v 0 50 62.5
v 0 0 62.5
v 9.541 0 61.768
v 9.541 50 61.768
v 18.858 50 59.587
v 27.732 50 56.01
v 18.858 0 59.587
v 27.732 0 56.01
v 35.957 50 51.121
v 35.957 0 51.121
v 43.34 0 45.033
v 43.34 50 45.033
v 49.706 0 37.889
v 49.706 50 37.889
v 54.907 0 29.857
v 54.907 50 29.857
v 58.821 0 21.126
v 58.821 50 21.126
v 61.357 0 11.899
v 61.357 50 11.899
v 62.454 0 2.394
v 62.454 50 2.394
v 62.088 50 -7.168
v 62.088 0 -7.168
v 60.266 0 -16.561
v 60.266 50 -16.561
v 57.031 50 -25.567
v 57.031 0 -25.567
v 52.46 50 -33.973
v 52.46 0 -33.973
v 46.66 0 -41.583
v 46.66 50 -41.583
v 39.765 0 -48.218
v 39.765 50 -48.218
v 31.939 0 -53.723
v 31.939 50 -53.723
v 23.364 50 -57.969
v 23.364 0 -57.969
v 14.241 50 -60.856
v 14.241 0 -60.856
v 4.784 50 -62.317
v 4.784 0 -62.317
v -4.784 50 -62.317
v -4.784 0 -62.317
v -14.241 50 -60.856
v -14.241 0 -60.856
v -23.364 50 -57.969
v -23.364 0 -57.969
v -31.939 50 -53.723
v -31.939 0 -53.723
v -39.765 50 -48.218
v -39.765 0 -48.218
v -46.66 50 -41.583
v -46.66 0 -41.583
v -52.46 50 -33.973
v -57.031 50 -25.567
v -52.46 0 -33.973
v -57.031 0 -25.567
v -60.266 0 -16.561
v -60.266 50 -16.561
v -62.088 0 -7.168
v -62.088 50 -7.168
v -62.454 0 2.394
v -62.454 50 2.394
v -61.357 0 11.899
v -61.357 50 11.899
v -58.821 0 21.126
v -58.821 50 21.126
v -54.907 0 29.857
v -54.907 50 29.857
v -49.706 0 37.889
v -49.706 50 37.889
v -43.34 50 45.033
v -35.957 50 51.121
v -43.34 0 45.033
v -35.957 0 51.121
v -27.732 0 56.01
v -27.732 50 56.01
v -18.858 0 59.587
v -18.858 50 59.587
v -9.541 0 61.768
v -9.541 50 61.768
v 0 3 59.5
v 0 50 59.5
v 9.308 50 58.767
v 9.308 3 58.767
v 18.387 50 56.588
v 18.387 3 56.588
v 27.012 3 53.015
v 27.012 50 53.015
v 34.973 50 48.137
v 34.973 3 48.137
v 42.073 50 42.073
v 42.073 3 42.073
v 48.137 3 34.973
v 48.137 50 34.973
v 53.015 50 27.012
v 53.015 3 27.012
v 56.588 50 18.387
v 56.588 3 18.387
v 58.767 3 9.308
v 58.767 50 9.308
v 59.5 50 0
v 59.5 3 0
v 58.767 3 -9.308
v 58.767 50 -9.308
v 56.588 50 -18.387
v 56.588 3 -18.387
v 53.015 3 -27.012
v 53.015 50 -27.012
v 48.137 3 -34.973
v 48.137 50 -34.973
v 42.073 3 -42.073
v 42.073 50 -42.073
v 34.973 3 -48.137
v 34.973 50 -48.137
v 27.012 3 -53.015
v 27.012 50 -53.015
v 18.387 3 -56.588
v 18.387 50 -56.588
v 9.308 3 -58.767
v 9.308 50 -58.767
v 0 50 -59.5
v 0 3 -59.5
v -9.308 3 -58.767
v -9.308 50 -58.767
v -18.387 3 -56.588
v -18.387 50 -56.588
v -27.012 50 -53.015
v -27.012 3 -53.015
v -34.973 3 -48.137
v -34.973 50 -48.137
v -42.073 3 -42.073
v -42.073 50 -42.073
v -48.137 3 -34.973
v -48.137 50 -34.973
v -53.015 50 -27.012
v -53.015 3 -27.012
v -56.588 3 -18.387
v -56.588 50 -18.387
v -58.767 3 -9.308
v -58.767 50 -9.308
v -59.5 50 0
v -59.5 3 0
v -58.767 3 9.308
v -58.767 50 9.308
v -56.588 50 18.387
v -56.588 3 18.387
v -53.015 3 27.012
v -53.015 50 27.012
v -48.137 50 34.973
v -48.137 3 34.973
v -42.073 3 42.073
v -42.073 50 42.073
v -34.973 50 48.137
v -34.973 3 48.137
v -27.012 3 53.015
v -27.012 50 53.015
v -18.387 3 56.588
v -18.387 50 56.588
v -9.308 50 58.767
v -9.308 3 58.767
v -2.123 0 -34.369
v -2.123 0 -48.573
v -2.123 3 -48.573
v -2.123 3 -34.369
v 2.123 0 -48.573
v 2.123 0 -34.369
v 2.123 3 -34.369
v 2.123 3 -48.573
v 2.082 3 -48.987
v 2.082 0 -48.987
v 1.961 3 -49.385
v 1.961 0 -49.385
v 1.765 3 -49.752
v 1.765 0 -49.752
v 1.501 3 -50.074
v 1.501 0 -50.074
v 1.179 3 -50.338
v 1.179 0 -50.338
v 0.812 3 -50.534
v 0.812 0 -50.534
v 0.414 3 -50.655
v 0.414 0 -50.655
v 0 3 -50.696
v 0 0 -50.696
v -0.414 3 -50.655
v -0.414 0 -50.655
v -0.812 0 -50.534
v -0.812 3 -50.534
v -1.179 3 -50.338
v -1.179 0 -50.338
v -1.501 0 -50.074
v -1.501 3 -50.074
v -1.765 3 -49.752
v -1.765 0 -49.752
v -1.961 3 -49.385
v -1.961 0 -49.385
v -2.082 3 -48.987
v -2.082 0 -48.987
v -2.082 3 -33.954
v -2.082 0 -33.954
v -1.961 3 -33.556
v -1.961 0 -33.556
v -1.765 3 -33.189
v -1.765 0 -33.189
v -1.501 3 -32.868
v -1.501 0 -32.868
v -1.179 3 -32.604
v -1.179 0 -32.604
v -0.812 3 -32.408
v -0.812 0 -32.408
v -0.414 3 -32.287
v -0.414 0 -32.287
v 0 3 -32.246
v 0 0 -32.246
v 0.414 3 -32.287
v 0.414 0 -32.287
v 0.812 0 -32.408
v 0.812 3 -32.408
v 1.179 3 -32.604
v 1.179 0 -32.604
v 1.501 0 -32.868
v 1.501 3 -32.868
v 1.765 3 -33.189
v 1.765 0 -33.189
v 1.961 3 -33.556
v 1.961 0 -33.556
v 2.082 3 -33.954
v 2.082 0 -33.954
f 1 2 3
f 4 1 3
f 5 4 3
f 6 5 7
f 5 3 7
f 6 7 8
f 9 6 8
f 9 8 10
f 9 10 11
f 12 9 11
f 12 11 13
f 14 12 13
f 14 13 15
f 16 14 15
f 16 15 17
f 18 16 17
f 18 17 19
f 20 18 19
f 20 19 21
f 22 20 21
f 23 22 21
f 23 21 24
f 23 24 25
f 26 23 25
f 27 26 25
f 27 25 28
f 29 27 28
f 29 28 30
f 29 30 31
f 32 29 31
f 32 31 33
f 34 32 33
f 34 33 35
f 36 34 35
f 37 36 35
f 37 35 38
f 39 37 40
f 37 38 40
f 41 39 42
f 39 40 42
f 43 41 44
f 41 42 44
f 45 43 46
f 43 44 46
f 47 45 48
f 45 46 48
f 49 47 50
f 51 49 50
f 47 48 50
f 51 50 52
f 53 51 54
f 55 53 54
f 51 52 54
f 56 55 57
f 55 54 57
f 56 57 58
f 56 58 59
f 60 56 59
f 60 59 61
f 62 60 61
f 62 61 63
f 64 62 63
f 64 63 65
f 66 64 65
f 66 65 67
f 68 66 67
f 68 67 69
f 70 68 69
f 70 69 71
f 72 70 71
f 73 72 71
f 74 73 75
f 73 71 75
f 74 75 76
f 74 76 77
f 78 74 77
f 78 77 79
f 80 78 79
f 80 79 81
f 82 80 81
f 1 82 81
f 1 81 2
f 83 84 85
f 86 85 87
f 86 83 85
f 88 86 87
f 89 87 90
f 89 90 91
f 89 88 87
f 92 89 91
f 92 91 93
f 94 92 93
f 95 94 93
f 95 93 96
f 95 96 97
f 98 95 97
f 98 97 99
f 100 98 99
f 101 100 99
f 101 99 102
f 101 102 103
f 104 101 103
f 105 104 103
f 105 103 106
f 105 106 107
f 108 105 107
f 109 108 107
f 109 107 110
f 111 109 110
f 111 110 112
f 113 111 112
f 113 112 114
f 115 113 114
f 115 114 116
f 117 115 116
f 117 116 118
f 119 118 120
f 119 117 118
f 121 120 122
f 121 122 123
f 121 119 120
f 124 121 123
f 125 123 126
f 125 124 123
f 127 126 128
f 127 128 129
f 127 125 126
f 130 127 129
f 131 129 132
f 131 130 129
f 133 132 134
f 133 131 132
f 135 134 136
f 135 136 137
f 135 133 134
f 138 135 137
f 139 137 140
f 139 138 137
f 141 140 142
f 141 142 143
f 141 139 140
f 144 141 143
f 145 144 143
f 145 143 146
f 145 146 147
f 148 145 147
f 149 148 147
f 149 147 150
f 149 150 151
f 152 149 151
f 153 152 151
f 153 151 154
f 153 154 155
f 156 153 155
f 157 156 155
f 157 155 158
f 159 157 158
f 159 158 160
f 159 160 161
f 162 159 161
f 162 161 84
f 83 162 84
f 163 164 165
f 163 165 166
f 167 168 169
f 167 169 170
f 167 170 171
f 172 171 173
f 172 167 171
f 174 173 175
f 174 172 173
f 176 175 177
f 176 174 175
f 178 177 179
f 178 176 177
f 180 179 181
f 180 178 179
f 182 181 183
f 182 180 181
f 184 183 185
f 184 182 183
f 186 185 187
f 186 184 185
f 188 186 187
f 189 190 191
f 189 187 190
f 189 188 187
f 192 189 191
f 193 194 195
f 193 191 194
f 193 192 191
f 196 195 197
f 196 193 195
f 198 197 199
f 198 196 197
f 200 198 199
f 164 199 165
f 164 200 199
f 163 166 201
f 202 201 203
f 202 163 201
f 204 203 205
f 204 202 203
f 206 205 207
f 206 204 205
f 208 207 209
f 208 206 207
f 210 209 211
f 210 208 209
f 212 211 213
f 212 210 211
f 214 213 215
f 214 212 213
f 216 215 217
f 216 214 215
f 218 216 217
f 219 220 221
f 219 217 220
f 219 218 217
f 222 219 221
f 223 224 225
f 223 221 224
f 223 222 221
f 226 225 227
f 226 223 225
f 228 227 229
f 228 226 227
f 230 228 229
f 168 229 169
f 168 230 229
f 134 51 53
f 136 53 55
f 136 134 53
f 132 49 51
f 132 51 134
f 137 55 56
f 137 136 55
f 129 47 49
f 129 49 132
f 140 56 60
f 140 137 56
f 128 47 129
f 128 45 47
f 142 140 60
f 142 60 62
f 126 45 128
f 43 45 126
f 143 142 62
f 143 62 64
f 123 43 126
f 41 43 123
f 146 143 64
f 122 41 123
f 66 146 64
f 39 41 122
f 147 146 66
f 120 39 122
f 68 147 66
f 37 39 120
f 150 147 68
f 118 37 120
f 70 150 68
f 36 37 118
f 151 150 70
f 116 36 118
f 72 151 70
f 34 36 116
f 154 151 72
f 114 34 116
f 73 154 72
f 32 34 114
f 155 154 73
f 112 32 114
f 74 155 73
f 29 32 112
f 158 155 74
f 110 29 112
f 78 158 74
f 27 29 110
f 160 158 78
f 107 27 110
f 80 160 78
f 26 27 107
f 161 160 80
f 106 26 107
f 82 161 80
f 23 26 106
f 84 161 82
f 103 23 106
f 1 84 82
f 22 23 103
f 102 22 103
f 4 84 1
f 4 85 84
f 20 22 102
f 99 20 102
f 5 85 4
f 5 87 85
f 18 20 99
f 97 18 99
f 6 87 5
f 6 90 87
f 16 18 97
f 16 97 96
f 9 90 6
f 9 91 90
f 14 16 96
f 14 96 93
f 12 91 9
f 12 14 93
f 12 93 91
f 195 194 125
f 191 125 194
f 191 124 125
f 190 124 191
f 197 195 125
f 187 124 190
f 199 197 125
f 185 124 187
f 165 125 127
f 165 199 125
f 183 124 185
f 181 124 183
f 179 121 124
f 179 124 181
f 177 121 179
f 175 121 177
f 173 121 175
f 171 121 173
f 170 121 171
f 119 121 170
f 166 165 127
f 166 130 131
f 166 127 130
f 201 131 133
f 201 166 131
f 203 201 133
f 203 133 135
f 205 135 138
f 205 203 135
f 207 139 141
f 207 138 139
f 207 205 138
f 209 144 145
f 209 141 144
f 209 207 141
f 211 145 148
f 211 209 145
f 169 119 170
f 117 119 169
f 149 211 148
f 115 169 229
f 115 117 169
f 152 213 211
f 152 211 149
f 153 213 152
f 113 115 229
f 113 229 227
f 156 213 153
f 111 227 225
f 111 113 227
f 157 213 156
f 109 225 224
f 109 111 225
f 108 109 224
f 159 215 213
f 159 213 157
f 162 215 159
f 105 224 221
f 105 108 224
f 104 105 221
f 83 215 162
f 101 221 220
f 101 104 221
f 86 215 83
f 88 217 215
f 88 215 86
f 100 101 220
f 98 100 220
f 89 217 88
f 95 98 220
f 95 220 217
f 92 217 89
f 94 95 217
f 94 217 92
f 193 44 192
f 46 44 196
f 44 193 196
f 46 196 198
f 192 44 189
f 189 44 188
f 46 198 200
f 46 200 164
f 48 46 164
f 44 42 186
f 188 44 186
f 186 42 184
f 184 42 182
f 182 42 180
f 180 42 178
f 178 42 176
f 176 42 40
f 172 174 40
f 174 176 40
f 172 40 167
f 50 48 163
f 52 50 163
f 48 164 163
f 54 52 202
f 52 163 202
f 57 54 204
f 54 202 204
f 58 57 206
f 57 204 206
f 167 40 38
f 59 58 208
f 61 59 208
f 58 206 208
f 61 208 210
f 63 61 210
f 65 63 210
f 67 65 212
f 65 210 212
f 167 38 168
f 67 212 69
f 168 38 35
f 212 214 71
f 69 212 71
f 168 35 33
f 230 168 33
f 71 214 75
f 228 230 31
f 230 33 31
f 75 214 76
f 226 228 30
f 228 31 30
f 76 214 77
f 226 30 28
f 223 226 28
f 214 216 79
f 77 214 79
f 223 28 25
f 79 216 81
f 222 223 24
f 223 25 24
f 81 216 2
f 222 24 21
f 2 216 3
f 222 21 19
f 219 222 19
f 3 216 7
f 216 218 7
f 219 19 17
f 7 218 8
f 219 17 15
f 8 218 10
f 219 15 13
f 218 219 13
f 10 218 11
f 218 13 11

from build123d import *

# Parameters (mm, degrees)
SKETCH1_R           = 62.5
BOSS_EXTRUDE1_DEPTH = 3
SKETCH1_3_R         = 62.5
SKETCH1_3_R_2       = 59.5
BOSS_EXTRUDE2_DEPTH = 50
CUT_EXTRUDE1_DEPTH  = 50


with BuildPart() as part:
    # Sketch1 → Boss-Extrude1 (new body)
    with BuildSketch(Plane(origin=(0, 0, 0), x_dir=(1, 0, 0), z_dir=(0, 1, 0))):
        Circle(SKETCH1_R)
    extrude(amount=BOSS_EXTRUDE1_DEPTH)

    # Sketch1<3> → Boss-Extrude2 (add)
    with BuildSketch(Plane(origin=(0, 0, 0), x_dir=(1, 0, 0), z_dir=(0, 1, 0))):
        Circle(SKETCH1_3_R)
        Circle(SKETCH1_3_R_2, mode=Mode.SUBTRACT)
    extrude(amount=BOSS_EXTRUDE2_DEPTH)

    # Sketch2 → Cut-Extrude1 (cut)
    with BuildSketch(Plane.XZ):
        with BuildLine():
            Line((-2.122524784, -48.573163327), (-2.122524784, -34.368574388))
            ThreePointArc((-2.122524784, -34.368574388), (0, -32.246049604), (2.122524784, -34.368574388))
            Line((2.122524784, -34.368574388), (2.122524784, -48.573163327))
            ThreePointArc((2.122524784, -48.573163327), (0, -50.695688111), (-2.122524784, -48.573163327))
        make_face()
    extrude(amount=-CUT_EXTRUDE1_DEPTH, mode=Mode.SUBTRACT)


solid = part.part
